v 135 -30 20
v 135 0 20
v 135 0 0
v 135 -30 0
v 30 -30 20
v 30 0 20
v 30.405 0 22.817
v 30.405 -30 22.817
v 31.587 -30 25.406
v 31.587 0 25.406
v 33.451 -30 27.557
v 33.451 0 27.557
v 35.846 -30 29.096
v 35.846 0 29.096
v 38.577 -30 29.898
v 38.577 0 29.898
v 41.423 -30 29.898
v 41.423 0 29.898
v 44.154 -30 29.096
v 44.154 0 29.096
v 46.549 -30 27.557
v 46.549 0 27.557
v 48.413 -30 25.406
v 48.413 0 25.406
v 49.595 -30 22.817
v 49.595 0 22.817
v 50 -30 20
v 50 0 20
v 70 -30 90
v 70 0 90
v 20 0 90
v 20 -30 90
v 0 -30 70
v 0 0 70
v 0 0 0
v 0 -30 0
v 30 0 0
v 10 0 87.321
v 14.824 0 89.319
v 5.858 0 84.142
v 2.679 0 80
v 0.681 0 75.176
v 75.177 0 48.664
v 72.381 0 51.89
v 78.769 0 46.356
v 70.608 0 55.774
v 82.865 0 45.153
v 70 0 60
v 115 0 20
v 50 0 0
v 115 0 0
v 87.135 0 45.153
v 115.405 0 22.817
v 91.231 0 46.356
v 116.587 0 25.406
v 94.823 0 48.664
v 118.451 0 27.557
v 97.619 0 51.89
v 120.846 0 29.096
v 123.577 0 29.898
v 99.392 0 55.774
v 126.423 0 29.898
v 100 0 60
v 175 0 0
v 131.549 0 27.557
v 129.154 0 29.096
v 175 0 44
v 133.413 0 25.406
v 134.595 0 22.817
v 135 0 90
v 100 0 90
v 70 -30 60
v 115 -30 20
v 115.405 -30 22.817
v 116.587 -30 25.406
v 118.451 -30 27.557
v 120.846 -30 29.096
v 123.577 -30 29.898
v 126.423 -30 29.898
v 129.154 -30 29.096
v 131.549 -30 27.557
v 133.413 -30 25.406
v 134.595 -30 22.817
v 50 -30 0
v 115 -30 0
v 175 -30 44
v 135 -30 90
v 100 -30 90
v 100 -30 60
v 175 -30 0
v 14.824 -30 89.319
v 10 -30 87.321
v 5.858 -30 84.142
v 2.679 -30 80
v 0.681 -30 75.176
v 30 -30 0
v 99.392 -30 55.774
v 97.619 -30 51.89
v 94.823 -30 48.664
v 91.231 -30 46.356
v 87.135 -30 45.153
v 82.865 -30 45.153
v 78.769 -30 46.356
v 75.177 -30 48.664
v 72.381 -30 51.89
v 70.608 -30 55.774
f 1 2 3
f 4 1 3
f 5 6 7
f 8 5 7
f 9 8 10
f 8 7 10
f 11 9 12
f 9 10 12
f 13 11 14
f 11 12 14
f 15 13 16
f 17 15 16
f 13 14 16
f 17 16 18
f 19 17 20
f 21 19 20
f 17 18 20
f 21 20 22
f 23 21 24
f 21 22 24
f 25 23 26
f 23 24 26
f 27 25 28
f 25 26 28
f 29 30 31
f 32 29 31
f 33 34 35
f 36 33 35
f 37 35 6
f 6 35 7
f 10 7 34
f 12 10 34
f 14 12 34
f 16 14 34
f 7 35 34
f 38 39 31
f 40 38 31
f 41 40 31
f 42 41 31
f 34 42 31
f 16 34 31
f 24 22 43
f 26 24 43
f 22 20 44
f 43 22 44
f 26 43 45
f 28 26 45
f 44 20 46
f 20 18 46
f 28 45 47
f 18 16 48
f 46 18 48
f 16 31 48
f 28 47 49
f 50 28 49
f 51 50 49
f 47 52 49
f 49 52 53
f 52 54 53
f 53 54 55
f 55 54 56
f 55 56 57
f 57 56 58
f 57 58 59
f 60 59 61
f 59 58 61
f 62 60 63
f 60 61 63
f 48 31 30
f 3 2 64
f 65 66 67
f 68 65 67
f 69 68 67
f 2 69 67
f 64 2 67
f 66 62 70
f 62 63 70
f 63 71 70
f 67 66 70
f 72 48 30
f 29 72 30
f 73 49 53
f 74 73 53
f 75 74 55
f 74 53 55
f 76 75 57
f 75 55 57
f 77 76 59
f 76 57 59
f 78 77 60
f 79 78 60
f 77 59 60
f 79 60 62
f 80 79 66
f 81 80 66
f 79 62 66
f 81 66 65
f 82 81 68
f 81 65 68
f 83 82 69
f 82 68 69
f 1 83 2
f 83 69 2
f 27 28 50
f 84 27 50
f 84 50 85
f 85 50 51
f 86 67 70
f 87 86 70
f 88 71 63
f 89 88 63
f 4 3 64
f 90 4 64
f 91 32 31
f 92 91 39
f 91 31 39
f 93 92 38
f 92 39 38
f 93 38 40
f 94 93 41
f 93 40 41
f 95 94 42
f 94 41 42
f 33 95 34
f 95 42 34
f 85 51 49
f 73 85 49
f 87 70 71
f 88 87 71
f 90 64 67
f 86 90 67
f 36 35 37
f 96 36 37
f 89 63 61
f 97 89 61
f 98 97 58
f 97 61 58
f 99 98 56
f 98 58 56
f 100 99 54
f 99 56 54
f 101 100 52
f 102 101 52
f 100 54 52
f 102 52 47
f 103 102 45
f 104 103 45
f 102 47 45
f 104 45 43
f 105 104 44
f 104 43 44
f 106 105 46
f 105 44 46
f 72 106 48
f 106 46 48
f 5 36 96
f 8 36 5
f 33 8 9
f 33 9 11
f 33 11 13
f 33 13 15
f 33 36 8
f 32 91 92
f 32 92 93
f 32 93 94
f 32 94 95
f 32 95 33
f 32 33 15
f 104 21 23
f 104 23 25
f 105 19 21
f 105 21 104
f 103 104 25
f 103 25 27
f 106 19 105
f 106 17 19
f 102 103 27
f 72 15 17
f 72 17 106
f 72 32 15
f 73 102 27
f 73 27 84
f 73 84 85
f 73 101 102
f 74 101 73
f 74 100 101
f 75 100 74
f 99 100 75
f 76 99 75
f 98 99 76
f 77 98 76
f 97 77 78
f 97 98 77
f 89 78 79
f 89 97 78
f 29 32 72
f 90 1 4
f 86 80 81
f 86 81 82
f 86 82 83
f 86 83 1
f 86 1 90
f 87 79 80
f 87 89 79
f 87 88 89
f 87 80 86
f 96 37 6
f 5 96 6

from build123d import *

# Parameters (mm, degrees)
F1_DEPTH = 30


with BuildPart() as f1:
    # F0 (on Front) → F1 (new body)
    with BuildSketch(Plane.XZ):
        with BuildLine():
            Line((0, 70), (0, 0))
            Line((0, 0), (30, 0))
            Line((30, 0), (30, 20))
            ThreePointArc((30, 20), (40, 30), (50, 20))
            Line((50, 20), (50, 0))
            Line((50, 0), (115, 0))
            Line((115, 0), (115, 20))
            ThreePointArc((115, 20), (125, 30), (135, 20))
            Line((135, 20), (135, 0))
            Line((135, 0), (175, 0))
            Line((175, 0), (175, 44))
            Line((175, 44), (135, 90))
            Line((135, 90), (100, 90))
            Line((100, 90), (100, 60))
            ThreePointArc((100, 60), (85, 45), (70, 60))
            Line((70, 60), (70, 90))
            Line((70, 90), (20, 90))
            ThreePointArc((20, 90), (5.857864, 84.142136), (0, 70))
        make_face()
    extrude(amount=F1_DEPTH)


solid = f1.part
